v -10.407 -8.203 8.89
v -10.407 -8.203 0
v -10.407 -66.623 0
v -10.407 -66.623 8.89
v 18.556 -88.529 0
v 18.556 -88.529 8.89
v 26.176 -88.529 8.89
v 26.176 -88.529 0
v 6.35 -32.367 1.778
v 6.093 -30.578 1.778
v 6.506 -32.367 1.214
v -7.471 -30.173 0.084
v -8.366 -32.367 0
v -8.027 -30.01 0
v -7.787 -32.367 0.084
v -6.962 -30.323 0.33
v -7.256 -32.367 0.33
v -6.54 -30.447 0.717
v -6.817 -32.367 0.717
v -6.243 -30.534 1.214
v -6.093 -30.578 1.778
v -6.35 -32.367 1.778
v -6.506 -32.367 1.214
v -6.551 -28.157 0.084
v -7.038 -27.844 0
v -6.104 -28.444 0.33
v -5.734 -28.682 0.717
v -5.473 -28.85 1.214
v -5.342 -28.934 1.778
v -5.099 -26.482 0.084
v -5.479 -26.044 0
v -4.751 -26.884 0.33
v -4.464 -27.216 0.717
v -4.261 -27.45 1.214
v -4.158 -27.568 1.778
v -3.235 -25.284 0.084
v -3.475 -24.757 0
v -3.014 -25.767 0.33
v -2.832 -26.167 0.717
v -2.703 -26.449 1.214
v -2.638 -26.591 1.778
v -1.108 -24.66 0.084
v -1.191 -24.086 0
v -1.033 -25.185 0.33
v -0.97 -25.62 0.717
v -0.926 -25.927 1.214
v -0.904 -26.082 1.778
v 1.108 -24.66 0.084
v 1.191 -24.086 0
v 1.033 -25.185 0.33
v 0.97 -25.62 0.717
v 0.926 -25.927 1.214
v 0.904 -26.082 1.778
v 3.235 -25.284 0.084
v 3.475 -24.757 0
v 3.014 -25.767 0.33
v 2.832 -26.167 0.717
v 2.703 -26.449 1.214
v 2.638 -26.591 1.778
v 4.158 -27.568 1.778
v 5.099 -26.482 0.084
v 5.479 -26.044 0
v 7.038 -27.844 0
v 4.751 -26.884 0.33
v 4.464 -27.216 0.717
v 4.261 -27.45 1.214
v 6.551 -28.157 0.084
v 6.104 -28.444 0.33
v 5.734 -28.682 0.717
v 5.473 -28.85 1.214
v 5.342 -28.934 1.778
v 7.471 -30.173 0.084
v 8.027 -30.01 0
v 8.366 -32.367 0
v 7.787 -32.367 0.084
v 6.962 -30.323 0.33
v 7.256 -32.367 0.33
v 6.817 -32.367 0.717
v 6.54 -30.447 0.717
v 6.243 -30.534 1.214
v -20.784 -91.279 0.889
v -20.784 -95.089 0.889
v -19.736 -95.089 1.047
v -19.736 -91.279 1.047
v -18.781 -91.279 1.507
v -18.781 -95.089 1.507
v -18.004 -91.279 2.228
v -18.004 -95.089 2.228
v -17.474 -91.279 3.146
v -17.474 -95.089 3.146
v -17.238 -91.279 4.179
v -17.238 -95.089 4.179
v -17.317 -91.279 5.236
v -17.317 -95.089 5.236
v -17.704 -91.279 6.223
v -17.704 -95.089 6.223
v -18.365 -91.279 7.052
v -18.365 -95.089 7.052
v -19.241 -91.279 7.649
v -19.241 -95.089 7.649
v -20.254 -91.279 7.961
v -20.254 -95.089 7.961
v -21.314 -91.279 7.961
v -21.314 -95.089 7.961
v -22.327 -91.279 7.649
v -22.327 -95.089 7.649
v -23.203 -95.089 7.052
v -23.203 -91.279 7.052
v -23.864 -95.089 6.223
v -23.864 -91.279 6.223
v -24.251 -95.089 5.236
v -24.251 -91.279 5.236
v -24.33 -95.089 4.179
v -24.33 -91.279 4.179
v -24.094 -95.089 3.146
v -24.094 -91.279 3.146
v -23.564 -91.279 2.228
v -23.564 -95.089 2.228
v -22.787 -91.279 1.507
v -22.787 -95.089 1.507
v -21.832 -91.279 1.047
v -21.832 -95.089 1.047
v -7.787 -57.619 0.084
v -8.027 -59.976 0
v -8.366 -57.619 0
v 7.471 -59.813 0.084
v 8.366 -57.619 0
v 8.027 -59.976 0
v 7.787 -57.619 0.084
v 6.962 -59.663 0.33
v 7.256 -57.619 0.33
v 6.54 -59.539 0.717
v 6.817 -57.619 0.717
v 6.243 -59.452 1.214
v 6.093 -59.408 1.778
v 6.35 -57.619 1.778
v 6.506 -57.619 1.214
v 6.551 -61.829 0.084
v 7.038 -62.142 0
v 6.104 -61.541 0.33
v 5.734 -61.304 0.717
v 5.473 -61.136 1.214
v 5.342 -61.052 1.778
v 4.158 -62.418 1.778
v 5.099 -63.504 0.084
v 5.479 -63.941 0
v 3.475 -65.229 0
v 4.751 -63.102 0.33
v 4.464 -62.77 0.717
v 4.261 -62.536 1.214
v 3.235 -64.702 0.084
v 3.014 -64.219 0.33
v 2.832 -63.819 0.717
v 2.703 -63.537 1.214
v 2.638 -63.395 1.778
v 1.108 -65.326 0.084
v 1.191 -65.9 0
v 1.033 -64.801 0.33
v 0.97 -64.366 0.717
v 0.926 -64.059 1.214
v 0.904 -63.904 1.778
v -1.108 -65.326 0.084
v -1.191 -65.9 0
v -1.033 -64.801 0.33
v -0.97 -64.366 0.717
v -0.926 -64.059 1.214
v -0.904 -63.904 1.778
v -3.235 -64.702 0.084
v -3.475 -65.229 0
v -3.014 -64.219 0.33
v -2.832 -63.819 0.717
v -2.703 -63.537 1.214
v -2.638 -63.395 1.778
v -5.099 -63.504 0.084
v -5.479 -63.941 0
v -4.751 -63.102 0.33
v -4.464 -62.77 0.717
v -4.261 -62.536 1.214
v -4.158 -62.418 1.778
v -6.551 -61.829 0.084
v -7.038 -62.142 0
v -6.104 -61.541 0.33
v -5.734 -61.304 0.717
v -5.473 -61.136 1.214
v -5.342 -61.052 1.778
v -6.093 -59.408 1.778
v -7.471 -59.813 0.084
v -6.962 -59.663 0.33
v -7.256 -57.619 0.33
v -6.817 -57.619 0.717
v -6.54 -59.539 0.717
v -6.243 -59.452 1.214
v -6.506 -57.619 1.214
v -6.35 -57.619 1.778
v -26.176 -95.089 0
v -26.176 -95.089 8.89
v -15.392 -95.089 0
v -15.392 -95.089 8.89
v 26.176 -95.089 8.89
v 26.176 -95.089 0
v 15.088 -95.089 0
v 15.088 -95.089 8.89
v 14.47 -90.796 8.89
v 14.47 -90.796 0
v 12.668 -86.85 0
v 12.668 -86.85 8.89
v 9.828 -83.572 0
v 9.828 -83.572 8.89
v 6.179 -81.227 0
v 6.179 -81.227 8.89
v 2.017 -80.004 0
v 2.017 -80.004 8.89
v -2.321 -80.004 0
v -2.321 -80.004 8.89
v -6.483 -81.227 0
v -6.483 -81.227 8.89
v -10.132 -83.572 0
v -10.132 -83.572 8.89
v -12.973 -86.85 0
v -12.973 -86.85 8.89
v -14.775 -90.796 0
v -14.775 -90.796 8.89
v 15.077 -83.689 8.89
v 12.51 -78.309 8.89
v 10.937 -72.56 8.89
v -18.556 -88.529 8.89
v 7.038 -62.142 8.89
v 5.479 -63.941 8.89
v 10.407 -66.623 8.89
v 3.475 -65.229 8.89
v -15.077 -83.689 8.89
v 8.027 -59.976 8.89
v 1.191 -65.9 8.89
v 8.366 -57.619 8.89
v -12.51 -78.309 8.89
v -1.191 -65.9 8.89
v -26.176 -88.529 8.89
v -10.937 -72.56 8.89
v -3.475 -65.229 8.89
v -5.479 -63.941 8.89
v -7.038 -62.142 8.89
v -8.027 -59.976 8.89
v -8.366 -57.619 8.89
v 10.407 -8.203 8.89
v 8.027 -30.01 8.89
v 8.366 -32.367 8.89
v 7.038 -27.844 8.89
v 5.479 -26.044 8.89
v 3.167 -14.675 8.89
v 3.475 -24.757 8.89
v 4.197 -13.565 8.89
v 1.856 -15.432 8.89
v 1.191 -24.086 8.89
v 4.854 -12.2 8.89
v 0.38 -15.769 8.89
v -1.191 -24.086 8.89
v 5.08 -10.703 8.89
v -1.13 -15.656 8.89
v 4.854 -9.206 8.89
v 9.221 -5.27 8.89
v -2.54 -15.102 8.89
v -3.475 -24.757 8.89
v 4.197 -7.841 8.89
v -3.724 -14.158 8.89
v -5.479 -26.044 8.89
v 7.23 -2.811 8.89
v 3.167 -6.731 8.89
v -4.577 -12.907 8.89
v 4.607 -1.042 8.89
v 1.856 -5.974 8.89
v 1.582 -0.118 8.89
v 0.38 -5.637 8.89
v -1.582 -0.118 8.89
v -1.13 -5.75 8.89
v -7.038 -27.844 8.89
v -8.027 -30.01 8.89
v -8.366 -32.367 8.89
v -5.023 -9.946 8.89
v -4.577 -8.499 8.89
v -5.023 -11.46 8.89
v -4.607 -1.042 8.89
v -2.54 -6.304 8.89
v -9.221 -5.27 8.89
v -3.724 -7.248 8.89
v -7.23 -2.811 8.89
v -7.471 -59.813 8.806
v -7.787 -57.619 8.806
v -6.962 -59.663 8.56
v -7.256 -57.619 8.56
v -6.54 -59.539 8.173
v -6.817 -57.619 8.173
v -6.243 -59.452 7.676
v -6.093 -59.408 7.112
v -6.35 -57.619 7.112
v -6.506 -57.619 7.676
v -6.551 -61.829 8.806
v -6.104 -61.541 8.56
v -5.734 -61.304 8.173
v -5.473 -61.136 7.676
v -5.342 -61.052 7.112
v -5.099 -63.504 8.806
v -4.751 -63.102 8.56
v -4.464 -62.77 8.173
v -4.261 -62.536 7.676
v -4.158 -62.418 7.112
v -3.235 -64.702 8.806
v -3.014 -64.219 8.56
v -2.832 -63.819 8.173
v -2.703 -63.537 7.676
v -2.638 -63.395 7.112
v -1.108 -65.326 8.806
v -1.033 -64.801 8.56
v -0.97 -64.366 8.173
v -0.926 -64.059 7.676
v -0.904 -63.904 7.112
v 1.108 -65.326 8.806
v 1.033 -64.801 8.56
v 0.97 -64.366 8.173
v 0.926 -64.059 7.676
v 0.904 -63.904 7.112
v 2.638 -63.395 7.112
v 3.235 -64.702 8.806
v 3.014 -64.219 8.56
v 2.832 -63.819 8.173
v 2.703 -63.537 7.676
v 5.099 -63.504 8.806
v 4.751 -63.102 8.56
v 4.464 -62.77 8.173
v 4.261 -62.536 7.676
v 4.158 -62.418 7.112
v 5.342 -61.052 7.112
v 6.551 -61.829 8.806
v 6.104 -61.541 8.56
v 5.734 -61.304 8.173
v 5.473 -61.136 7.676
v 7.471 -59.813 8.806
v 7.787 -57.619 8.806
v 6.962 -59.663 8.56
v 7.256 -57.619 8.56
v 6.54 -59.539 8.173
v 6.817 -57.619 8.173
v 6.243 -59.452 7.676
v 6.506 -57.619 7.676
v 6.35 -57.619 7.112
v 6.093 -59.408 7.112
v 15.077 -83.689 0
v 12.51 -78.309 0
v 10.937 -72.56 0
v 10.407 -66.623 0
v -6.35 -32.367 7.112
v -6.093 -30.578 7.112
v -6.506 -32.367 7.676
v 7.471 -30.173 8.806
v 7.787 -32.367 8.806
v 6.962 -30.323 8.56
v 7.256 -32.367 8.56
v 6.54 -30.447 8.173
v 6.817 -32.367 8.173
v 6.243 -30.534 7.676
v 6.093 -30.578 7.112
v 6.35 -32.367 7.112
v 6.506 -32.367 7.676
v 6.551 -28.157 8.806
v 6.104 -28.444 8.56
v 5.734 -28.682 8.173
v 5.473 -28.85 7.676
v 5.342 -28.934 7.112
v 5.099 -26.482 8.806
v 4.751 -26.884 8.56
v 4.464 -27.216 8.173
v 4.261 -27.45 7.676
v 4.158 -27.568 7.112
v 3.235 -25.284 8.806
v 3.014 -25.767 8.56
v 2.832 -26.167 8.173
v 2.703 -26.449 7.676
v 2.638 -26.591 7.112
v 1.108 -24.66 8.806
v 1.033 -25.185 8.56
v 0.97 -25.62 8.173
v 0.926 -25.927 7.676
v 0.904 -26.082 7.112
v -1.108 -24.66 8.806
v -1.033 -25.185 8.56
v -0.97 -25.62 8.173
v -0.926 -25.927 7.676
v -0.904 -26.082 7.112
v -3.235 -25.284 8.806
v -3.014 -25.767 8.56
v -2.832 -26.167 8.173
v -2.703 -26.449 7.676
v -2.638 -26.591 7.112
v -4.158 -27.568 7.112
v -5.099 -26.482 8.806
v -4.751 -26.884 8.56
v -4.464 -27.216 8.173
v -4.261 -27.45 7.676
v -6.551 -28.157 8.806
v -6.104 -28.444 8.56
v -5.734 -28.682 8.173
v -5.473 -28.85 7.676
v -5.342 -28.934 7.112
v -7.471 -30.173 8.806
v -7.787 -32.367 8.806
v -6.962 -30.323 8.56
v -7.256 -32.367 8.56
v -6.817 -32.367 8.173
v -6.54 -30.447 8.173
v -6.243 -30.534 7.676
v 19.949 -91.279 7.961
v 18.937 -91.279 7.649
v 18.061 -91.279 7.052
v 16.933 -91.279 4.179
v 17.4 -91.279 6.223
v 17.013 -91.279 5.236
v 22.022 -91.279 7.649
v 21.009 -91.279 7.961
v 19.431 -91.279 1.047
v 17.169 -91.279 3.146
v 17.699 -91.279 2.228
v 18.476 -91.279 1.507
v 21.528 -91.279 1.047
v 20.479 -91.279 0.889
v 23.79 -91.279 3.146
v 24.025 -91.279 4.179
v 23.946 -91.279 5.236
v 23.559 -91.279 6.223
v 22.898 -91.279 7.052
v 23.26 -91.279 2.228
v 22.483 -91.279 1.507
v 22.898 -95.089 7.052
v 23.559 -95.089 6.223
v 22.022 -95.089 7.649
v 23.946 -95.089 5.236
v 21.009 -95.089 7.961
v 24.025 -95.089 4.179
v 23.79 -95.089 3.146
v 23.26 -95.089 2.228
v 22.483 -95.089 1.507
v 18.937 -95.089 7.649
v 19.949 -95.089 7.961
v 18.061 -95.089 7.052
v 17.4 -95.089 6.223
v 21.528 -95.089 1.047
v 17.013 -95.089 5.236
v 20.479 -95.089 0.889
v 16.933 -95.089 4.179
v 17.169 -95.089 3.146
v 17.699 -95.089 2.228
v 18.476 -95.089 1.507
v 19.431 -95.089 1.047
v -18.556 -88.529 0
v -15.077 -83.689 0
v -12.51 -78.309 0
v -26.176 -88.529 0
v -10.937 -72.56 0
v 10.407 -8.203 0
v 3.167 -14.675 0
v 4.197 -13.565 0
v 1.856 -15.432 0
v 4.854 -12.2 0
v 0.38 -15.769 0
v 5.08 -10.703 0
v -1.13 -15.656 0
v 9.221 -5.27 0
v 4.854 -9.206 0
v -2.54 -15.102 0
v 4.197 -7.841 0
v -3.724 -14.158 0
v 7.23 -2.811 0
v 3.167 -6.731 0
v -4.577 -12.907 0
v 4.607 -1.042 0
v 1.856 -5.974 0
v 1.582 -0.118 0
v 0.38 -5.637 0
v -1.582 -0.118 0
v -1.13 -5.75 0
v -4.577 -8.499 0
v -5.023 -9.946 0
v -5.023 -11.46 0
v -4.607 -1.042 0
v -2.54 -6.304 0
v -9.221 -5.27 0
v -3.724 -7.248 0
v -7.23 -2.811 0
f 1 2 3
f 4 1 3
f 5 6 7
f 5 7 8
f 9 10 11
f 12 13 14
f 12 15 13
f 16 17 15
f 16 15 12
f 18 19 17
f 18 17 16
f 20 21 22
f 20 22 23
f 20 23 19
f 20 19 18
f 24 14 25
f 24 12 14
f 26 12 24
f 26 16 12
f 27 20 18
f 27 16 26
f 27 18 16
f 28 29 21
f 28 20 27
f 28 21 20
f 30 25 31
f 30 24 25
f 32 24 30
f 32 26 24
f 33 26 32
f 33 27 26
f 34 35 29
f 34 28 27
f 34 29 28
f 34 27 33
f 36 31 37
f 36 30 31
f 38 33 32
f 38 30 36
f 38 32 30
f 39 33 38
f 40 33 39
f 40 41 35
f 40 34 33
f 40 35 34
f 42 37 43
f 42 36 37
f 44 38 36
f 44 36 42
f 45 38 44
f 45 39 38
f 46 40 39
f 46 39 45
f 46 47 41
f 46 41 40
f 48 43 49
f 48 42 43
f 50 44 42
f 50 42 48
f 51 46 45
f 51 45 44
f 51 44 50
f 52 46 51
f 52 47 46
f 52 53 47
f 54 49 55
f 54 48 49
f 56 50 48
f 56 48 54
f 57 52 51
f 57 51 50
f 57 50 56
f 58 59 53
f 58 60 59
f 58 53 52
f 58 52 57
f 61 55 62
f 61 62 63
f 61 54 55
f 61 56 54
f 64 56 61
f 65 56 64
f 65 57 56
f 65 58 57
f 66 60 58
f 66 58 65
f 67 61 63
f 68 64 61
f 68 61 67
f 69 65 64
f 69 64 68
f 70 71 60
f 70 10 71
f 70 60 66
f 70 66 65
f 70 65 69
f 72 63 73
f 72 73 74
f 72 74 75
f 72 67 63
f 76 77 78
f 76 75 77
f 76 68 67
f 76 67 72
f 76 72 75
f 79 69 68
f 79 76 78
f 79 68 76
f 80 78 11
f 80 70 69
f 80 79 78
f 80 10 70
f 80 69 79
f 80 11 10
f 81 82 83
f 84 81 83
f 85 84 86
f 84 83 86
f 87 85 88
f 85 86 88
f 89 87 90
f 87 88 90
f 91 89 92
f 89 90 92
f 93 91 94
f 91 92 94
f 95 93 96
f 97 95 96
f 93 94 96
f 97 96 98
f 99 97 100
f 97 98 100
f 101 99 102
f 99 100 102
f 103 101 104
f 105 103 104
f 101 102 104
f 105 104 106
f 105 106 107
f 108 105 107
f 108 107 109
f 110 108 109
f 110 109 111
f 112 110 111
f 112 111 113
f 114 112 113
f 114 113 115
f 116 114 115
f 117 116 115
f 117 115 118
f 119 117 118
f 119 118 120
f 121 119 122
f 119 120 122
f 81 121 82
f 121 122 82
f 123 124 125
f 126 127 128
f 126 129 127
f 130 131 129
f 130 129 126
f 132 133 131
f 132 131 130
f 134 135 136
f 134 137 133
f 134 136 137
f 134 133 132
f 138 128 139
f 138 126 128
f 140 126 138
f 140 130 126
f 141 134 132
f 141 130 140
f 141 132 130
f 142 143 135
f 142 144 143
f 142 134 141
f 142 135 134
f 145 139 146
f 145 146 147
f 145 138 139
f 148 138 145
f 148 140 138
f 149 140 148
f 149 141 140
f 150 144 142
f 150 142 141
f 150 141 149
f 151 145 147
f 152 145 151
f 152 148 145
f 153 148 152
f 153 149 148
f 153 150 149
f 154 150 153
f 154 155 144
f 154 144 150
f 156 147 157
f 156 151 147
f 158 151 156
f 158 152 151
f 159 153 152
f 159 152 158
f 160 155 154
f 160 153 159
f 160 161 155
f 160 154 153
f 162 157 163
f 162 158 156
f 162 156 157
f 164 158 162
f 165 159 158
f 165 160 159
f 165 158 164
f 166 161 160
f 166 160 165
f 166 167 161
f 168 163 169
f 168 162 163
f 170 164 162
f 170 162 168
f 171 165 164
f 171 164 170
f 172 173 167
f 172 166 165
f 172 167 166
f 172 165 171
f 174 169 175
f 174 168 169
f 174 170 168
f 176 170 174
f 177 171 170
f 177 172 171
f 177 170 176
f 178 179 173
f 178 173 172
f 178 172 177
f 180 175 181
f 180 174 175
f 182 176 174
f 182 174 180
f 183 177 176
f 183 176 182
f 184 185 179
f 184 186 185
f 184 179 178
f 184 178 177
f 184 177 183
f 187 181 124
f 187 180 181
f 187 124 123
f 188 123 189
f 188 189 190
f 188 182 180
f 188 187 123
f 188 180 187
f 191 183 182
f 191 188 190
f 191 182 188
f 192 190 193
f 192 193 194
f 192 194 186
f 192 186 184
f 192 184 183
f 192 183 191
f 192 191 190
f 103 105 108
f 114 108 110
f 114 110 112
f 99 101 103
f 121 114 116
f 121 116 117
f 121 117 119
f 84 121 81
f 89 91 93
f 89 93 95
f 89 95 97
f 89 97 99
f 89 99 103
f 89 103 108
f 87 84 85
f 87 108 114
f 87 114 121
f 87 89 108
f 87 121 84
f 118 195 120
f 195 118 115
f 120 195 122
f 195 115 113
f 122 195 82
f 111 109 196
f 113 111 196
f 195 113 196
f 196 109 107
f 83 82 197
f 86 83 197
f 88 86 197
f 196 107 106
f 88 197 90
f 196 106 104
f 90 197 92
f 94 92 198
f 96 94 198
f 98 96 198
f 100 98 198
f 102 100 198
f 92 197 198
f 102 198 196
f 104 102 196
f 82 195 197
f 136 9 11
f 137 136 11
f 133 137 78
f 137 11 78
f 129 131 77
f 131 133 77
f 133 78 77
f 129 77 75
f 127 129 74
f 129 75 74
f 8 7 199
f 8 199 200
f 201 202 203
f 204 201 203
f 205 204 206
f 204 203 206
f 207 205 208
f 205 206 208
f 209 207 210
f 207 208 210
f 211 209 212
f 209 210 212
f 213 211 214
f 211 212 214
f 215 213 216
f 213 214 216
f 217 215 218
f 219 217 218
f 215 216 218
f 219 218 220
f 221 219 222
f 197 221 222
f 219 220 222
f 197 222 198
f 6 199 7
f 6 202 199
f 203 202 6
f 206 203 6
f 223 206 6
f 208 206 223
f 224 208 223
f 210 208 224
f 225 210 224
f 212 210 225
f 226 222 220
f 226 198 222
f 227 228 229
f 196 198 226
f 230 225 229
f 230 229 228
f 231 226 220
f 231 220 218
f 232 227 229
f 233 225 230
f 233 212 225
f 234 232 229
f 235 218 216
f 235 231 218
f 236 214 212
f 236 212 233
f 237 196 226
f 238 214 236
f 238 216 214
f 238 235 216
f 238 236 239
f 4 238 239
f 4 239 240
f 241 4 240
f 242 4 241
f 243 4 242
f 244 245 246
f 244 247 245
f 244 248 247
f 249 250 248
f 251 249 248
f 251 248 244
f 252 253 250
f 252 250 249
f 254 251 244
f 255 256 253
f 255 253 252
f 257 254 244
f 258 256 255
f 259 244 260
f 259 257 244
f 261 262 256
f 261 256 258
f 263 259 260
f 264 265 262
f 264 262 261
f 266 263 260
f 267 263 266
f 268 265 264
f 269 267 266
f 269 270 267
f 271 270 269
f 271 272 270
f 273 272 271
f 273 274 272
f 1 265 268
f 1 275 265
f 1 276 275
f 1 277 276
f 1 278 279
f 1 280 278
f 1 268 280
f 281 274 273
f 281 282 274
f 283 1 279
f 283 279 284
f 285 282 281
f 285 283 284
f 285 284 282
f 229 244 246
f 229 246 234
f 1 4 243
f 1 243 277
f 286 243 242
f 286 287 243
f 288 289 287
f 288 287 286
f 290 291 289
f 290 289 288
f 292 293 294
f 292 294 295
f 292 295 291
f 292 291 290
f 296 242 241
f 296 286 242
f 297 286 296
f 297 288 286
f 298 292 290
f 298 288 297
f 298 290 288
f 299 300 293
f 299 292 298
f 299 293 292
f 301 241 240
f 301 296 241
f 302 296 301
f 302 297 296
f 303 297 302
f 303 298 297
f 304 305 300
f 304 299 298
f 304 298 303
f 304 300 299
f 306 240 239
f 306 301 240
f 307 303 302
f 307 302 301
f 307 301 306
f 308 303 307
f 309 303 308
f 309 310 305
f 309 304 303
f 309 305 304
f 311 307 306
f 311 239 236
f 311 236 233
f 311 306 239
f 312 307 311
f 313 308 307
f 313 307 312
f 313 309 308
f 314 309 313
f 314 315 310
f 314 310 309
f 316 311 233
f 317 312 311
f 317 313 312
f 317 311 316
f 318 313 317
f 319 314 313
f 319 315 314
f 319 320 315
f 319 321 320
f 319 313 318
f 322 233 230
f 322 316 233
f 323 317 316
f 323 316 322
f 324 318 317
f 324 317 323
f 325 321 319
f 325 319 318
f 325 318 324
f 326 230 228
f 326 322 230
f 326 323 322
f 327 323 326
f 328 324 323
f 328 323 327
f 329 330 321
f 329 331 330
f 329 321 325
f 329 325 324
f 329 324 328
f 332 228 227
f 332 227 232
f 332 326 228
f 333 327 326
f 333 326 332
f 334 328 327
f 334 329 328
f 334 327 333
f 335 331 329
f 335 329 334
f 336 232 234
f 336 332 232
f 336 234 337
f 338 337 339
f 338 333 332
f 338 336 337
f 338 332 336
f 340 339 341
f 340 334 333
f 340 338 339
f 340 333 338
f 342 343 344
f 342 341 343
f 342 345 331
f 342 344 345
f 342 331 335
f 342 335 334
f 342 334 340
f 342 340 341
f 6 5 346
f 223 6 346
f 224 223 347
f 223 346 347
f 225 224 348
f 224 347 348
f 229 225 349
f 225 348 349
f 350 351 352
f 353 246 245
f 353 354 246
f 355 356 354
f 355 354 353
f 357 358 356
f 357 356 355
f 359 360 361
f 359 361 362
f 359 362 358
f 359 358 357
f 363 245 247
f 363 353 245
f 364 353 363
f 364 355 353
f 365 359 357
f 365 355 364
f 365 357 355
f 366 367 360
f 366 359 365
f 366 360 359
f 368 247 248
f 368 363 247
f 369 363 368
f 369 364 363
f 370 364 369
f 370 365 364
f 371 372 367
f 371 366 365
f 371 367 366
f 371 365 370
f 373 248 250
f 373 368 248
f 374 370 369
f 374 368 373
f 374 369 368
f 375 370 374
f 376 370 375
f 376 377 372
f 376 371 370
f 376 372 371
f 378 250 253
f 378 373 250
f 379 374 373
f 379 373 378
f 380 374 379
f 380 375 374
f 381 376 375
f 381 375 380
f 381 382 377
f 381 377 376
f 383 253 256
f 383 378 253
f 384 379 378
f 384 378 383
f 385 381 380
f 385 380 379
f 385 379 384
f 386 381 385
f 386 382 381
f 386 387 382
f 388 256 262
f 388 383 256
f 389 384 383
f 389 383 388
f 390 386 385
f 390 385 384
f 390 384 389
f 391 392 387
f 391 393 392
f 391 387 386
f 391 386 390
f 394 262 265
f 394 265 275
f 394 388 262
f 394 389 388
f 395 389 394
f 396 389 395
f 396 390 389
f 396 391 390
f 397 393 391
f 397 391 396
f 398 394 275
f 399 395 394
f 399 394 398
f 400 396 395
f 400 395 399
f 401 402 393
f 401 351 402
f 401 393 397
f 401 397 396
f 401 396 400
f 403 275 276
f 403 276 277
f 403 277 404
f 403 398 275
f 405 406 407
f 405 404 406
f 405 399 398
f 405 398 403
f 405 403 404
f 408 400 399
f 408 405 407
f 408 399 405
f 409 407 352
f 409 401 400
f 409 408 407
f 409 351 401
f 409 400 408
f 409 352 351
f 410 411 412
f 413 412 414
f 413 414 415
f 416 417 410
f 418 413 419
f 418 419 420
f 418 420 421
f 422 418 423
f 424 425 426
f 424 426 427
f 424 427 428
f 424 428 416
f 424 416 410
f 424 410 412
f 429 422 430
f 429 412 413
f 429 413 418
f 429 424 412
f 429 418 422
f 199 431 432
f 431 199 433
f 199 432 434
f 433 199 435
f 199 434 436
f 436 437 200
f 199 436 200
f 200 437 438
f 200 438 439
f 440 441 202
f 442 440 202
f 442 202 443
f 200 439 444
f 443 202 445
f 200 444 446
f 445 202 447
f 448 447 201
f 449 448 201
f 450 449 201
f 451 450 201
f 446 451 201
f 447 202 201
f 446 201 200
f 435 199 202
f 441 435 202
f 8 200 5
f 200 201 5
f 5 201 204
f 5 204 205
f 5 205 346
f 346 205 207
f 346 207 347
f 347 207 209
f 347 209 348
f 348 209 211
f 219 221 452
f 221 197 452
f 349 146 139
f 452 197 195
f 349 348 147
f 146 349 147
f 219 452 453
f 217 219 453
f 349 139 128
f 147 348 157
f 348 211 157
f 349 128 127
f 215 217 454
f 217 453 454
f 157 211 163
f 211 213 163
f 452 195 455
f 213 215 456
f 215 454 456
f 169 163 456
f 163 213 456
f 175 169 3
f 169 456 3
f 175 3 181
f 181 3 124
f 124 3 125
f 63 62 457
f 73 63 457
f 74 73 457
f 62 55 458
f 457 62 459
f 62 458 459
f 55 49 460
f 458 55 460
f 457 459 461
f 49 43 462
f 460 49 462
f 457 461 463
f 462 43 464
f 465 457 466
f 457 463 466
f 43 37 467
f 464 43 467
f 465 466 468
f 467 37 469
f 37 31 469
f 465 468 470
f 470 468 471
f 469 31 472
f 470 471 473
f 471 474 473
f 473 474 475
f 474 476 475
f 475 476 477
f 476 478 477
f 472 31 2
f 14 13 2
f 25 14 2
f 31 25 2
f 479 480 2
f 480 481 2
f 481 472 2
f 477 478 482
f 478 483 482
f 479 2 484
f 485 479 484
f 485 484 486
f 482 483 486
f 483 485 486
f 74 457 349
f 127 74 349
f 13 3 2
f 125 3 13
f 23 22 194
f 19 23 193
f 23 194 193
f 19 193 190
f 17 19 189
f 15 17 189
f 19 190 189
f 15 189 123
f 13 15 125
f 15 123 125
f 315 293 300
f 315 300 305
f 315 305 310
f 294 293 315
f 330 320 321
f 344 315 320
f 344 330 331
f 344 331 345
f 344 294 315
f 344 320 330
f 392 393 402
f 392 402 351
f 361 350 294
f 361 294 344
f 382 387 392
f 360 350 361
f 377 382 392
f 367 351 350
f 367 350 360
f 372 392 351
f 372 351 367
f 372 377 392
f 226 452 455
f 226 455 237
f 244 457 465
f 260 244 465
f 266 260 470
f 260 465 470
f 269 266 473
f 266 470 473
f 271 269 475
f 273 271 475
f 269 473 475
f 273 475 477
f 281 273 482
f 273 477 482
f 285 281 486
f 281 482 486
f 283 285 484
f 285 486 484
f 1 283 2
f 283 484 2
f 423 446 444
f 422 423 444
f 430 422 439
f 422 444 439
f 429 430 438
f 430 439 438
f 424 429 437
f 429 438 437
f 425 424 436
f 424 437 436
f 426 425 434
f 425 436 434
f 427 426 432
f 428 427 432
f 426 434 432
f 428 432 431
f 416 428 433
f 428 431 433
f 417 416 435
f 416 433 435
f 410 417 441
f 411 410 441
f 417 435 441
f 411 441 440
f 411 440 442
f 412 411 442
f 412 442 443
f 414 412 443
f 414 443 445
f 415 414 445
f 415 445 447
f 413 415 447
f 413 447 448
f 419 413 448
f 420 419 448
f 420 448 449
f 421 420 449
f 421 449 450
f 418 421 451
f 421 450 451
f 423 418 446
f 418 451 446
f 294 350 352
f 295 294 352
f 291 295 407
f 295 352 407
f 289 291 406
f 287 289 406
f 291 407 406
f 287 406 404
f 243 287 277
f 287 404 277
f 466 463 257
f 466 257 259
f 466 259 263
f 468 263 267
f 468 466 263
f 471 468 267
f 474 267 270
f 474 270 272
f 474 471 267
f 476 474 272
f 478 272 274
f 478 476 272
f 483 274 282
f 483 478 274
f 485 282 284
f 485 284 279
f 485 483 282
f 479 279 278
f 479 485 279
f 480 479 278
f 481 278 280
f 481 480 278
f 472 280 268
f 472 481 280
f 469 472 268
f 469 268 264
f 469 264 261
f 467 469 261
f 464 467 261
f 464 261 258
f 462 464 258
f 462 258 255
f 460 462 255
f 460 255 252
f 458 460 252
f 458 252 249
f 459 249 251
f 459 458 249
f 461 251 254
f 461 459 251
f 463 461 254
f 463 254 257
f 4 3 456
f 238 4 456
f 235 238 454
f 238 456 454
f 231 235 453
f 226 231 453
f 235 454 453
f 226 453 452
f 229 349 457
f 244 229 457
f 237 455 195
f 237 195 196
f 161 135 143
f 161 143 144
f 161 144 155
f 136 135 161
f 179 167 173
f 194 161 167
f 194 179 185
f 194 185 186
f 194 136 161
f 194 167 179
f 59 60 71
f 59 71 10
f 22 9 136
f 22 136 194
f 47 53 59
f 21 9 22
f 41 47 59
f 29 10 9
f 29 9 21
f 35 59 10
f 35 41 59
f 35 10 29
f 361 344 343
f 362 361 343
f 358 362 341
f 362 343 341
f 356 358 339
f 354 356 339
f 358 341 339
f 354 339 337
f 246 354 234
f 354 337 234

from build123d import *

# Parameters (mm, degrees)
SKETCH2_R           = 5.08
BOSS_EXTRUDE1_DEPTH = 8.89
CUT_EXTRUDE1_DEPTH  = 8.89
CUT_EXTRUDE4_DEPTH  = 1.778
CUT_EXTRUDE5_START  = -1.778
CUT_EXTRUDE5_DEPTH  = 1.778
SKETCH13_W          = 8.89
SKETCH13_H          = 6.560107066
BOSS_EXTRUDE6_DEPTH = 7.62
SKETCH14_W          = 8.89
SKETCH14_H          = 6.560107066
BOSS_EXTRUDE7_DEPTH = 7.62
FILLET1_R           = 2.032
SKETCH15_R          = 3.556
CUT_EXTRUDE6_DEPTH  = 3.81


with BuildPart() as part:
    # Sketch2 → Boss-Extrude1 (new body)
    with BuildSketch(Plane.XY):
        with BuildLine():
            Line((-10.406791551, -8.202588674), (-10.406791551, -66.622588674))
            ThreePointArc((-10.406791551, -66.622588674), (-12.510019722, -78.309204867), (-18.555768436, -88.529258158))
            Line((-18.555768436, -88.529258158), (-18.555768436, -95.089365224))
            Line((-18.555768436, -95.089365224), (18.555768436, -95.089365224))
            Line((18.555768436, -95.089365224), (18.555768436, -88.529258158))
            ThreePointArc((18.555768436, -88.529258158), (12.510019722, -78.309204867), (10.406791551, -66.622588674))
            Line((10.406791551, -66.622588674), (10.406791551, -8.202588674))
            ThreePointArc((10.406791551, -8.202588674), (0, 0), (-10.406791551, -8.202588674))
        make_face()
        with Locations((0, -10.702948686)):
            Circle(SKETCH2_R, mode=Mode.SUBTRACT)
    extrude(amount=BOSS_EXTRUDE1_DEPTH)

    # Sketch3 → Cut-Extrude1 (cut)
    with BuildSketch(Plane.XY.offset(8.89)):
        with BuildLine():
            Line((-15.392321471, -95.089365224), (15.087678529, -95.089365224))
            ThreePointArc((15.087678529, -95.089365224), (-0.152321471, -79.849365224), (-15.392321471, -95.089365224))
        make_face()
    extrude(amount=-CUT_EXTRUDE1_DEPTH, mode=Mode.SUBTRACT)

    # Sketch8 → Cut-Extrude4 (cut)
    with BuildSketch(Plane.XY.offset(8.89)):
        with BuildLine():
            Line((-6.35, -32.367098726), (-6.35, -57.618798646))
            ThreePointArc((-6.35, -57.618798646), (0, -63.968798646), (6.35, -57.618798646))
            Line((6.35, -57.618798646), (6.35, -32.367098726))
            ThreePointArc((6.35, -32.367098726), (0, -26.017098726), (-6.35, -32.367098726))
        make_face()
    extrude(amount=-CUT_EXTRUDE4_DEPTH, mode=Mode.SUBTRACT)

    # Sketch9 → Cut-Extrude5 (cut)
    with BuildSketch(Plane(origin=(0, 0, 0), x_dir=(-1, 0, 0), z_dir=(0, 0, -1)).offset(CUT_EXTRUDE5_START)):
        with BuildLine():
            Line((6.35, -57.618798646), (6.35, -32.367098726))
            ThreePointArc((6.35, -32.367098726), (0, -26.017098726), (-6.35, -32.367098726))
            Line((-6.35, -32.367098726), (-6.35, -57.618798646))
            ThreePointArc((-6.35, -57.618798646), (0, -63.968798646), (6.35, -57.618798646))
        make_face()
    extrude(amount=CUT_EXTRUDE5_DEPTH, mode=Mode.SUBTRACT)

    # Sketch13 → Boss-Extrude6 (add)
    with BuildSketch(Plane.ZY.offset(18.555768436)):
        with Locations((4.445, -91.809311691)):
            Rectangle(SKETCH13_W, SKETCH13_H)
    extrude(amount=BOSS_EXTRUDE6_DEPTH)

    # Sketch14 → Boss-Extrude7 (add)
    with BuildSketch(Plane(origin=(18.555768436, 0, 0), x_dir=(0, 0, -1), z_dir=(1, 0, 0))):
        with Locations((-4.445, -91.809311691)):
            Rectangle(SKETCH14_W, SKETCH14_H)
    extrude(amount=BOSS_EXTRUDE7_DEPTH)

    # Fillet1
    # the kernel refuses this fillet: 2.032 mm, written as the material it takes off along each edge
    with BuildSketch(Plane(origin=(0, -57.618798646, 0), x_dir=(1, 0, 0), z_dir=(0, 1, 0))) as fillet1_piece_1:
        with BuildLine():
            CenterArc((8.366062499, -2.032), FILLET1_R, 90, 82.819244219)
            Line((6.35, -1.778), (6.30967875, -1.77292))
            ThreePointArc((6.30967875, -1.77292), (6.30936, -0.889), (6.30936, 0))
            Line((6.30936, 0), (6.35, 0.04064))
            Line((6.35, 0.04064), (8.366062499, 0.04064))
            Line((8.366062499, 0.04064), (8.366062499, 0))
        make_face()
    revolve(axis=Axis((0, -57.618798646, 0), (0, 0, -1)), revolution_arc=180, mode=Mode.SUBTRACT)
    with BuildSketch(Plane(origin=(-6.35, -57.618798646, 0), x_dir=(-1, 0, 0), z_dir=(0, 1, 0)), Plane(origin=(6.35, -32.367098726, 0), x_dir=(1, 0, 0), z_dir=(0, -1, 0)), Plane(origin=(-6.35, -32.367098726, 8.89), x_dir=(-1, 0, 0), z_dir=(0, -1, 0)), Plane(origin=(6.35, -57.618798646, 8.89), x_dir=(1, 0, 0), z_dir=(0, 1, 0))) as fillet1_piece_2:
        with BuildLine():
            CenterArc((2.016062499, 2.032), FILLET1_R, 187.180755781, 82.819244219)
            Line((0, 1.778), (-0.04032125, 1.77292))
            ThreePointArc((-0.04032125, 1.77292), (-0.04064, 0.889), (-0.04064, 0))
            Line((-0.04064, 0), (0, -0.04064))
            Line((0, -0.04064), (2.016062499, -0.04064))
            Line((2.016062499, -0.04064), (2.016062499, 0))
        make_face()
    extrude(amount=25.251699921, mode=Mode.SUBTRACT)
    with BuildSketch(Plane(origin=(0, -32.367098726, 0), x_dir=(-1, 0, 0), z_dir=(0, -1, 0))) as fillet1_piece_3:
        with BuildLine():
            CenterArc((8.366062499, -2.032), FILLET1_R, 90, 82.819244219)
            Line((6.35, -1.778), (6.30967875, -1.77292))
            ThreePointArc((6.30967875, -1.77292), (6.30936, -0.889), (6.30936, 0))
            Line((6.30936, 0), (6.35, 0.04064))
            Line((6.35, 0.04064), (8.366062499, 0.04064))
            Line((8.366062499, 0.04064), (8.366062499, 0))
        make_face()
    revolve(axis=Axis((0, -32.367098726, 0), (0, 0, -1)), revolution_arc=180, mode=Mode.SUBTRACT)
    with BuildSketch(Plane(origin=(0, -32.367098726, 8.89), x_dir=(1, 0, 0), z_dir=(0, -1, 0))) as fillet1_piece_4:
        with BuildLine():
            CenterArc((8.366062499, -2.032), FILLET1_R, 90, 82.819244219)
            Line((6.35, -1.778), (6.30967875, -1.77292))
            ThreePointArc((6.30967875, -1.77292), (6.30936, -0.889), (6.30936, 0))
            Line((6.30936, 0), (6.35, 0.04064))
            Line((6.35, 0.04064), (8.366062499, 0.04064))
            Line((8.366062499, 0.04064), (8.366062499, 0))
        make_face()
    revolve(axis=Axis((0, -32.367098726, 8.89), (0, 0, 1)), revolution_arc=180, mode=Mode.SUBTRACT)
    with BuildSketch(Plane(origin=(0, -57.618798646, 8.89), x_dir=(-1, 0, 0), z_dir=(0, 1, 0))) as fillet1_piece_5:
        with BuildLine():
            CenterArc((8.366062499, -2.032), FILLET1_R, 90, 82.819244219)
            Line((6.35, -1.778), (6.30967875, -1.77292))
            ThreePointArc((6.30967875, -1.77292), (6.30936, -0.889), (6.30936, 0))
            Line((6.30936, 0), (6.35, 0.04064))
            Line((6.35, 0.04064), (8.366062499, 0.04064))
            Line((8.366062499, 0.04064), (8.366062499, 0))
        make_face()
    revolve(axis=Axis((0, -57.618798646, 8.89), (0, 0, 1)), revolution_arc=180, mode=Mode.SUBTRACT)

    # Sketch15 → Cut-Extrude6 (cut)
    with BuildSketch(Plane.XZ.offset(95.089365224)):
        with Locations(Location((-20.784044953, 4.445, 0), (0, 0, 270))):
            Circle(SKETCH15_R)
        with Locations(Location((20.479402012, 4.445, 0), (0, 0, 270))):
            Circle(SKETCH15_R)
    extrude(amount=-CUT_EXTRUDE6_DEPTH, mode=Mode.SUBTRACT)


solid = part.part
